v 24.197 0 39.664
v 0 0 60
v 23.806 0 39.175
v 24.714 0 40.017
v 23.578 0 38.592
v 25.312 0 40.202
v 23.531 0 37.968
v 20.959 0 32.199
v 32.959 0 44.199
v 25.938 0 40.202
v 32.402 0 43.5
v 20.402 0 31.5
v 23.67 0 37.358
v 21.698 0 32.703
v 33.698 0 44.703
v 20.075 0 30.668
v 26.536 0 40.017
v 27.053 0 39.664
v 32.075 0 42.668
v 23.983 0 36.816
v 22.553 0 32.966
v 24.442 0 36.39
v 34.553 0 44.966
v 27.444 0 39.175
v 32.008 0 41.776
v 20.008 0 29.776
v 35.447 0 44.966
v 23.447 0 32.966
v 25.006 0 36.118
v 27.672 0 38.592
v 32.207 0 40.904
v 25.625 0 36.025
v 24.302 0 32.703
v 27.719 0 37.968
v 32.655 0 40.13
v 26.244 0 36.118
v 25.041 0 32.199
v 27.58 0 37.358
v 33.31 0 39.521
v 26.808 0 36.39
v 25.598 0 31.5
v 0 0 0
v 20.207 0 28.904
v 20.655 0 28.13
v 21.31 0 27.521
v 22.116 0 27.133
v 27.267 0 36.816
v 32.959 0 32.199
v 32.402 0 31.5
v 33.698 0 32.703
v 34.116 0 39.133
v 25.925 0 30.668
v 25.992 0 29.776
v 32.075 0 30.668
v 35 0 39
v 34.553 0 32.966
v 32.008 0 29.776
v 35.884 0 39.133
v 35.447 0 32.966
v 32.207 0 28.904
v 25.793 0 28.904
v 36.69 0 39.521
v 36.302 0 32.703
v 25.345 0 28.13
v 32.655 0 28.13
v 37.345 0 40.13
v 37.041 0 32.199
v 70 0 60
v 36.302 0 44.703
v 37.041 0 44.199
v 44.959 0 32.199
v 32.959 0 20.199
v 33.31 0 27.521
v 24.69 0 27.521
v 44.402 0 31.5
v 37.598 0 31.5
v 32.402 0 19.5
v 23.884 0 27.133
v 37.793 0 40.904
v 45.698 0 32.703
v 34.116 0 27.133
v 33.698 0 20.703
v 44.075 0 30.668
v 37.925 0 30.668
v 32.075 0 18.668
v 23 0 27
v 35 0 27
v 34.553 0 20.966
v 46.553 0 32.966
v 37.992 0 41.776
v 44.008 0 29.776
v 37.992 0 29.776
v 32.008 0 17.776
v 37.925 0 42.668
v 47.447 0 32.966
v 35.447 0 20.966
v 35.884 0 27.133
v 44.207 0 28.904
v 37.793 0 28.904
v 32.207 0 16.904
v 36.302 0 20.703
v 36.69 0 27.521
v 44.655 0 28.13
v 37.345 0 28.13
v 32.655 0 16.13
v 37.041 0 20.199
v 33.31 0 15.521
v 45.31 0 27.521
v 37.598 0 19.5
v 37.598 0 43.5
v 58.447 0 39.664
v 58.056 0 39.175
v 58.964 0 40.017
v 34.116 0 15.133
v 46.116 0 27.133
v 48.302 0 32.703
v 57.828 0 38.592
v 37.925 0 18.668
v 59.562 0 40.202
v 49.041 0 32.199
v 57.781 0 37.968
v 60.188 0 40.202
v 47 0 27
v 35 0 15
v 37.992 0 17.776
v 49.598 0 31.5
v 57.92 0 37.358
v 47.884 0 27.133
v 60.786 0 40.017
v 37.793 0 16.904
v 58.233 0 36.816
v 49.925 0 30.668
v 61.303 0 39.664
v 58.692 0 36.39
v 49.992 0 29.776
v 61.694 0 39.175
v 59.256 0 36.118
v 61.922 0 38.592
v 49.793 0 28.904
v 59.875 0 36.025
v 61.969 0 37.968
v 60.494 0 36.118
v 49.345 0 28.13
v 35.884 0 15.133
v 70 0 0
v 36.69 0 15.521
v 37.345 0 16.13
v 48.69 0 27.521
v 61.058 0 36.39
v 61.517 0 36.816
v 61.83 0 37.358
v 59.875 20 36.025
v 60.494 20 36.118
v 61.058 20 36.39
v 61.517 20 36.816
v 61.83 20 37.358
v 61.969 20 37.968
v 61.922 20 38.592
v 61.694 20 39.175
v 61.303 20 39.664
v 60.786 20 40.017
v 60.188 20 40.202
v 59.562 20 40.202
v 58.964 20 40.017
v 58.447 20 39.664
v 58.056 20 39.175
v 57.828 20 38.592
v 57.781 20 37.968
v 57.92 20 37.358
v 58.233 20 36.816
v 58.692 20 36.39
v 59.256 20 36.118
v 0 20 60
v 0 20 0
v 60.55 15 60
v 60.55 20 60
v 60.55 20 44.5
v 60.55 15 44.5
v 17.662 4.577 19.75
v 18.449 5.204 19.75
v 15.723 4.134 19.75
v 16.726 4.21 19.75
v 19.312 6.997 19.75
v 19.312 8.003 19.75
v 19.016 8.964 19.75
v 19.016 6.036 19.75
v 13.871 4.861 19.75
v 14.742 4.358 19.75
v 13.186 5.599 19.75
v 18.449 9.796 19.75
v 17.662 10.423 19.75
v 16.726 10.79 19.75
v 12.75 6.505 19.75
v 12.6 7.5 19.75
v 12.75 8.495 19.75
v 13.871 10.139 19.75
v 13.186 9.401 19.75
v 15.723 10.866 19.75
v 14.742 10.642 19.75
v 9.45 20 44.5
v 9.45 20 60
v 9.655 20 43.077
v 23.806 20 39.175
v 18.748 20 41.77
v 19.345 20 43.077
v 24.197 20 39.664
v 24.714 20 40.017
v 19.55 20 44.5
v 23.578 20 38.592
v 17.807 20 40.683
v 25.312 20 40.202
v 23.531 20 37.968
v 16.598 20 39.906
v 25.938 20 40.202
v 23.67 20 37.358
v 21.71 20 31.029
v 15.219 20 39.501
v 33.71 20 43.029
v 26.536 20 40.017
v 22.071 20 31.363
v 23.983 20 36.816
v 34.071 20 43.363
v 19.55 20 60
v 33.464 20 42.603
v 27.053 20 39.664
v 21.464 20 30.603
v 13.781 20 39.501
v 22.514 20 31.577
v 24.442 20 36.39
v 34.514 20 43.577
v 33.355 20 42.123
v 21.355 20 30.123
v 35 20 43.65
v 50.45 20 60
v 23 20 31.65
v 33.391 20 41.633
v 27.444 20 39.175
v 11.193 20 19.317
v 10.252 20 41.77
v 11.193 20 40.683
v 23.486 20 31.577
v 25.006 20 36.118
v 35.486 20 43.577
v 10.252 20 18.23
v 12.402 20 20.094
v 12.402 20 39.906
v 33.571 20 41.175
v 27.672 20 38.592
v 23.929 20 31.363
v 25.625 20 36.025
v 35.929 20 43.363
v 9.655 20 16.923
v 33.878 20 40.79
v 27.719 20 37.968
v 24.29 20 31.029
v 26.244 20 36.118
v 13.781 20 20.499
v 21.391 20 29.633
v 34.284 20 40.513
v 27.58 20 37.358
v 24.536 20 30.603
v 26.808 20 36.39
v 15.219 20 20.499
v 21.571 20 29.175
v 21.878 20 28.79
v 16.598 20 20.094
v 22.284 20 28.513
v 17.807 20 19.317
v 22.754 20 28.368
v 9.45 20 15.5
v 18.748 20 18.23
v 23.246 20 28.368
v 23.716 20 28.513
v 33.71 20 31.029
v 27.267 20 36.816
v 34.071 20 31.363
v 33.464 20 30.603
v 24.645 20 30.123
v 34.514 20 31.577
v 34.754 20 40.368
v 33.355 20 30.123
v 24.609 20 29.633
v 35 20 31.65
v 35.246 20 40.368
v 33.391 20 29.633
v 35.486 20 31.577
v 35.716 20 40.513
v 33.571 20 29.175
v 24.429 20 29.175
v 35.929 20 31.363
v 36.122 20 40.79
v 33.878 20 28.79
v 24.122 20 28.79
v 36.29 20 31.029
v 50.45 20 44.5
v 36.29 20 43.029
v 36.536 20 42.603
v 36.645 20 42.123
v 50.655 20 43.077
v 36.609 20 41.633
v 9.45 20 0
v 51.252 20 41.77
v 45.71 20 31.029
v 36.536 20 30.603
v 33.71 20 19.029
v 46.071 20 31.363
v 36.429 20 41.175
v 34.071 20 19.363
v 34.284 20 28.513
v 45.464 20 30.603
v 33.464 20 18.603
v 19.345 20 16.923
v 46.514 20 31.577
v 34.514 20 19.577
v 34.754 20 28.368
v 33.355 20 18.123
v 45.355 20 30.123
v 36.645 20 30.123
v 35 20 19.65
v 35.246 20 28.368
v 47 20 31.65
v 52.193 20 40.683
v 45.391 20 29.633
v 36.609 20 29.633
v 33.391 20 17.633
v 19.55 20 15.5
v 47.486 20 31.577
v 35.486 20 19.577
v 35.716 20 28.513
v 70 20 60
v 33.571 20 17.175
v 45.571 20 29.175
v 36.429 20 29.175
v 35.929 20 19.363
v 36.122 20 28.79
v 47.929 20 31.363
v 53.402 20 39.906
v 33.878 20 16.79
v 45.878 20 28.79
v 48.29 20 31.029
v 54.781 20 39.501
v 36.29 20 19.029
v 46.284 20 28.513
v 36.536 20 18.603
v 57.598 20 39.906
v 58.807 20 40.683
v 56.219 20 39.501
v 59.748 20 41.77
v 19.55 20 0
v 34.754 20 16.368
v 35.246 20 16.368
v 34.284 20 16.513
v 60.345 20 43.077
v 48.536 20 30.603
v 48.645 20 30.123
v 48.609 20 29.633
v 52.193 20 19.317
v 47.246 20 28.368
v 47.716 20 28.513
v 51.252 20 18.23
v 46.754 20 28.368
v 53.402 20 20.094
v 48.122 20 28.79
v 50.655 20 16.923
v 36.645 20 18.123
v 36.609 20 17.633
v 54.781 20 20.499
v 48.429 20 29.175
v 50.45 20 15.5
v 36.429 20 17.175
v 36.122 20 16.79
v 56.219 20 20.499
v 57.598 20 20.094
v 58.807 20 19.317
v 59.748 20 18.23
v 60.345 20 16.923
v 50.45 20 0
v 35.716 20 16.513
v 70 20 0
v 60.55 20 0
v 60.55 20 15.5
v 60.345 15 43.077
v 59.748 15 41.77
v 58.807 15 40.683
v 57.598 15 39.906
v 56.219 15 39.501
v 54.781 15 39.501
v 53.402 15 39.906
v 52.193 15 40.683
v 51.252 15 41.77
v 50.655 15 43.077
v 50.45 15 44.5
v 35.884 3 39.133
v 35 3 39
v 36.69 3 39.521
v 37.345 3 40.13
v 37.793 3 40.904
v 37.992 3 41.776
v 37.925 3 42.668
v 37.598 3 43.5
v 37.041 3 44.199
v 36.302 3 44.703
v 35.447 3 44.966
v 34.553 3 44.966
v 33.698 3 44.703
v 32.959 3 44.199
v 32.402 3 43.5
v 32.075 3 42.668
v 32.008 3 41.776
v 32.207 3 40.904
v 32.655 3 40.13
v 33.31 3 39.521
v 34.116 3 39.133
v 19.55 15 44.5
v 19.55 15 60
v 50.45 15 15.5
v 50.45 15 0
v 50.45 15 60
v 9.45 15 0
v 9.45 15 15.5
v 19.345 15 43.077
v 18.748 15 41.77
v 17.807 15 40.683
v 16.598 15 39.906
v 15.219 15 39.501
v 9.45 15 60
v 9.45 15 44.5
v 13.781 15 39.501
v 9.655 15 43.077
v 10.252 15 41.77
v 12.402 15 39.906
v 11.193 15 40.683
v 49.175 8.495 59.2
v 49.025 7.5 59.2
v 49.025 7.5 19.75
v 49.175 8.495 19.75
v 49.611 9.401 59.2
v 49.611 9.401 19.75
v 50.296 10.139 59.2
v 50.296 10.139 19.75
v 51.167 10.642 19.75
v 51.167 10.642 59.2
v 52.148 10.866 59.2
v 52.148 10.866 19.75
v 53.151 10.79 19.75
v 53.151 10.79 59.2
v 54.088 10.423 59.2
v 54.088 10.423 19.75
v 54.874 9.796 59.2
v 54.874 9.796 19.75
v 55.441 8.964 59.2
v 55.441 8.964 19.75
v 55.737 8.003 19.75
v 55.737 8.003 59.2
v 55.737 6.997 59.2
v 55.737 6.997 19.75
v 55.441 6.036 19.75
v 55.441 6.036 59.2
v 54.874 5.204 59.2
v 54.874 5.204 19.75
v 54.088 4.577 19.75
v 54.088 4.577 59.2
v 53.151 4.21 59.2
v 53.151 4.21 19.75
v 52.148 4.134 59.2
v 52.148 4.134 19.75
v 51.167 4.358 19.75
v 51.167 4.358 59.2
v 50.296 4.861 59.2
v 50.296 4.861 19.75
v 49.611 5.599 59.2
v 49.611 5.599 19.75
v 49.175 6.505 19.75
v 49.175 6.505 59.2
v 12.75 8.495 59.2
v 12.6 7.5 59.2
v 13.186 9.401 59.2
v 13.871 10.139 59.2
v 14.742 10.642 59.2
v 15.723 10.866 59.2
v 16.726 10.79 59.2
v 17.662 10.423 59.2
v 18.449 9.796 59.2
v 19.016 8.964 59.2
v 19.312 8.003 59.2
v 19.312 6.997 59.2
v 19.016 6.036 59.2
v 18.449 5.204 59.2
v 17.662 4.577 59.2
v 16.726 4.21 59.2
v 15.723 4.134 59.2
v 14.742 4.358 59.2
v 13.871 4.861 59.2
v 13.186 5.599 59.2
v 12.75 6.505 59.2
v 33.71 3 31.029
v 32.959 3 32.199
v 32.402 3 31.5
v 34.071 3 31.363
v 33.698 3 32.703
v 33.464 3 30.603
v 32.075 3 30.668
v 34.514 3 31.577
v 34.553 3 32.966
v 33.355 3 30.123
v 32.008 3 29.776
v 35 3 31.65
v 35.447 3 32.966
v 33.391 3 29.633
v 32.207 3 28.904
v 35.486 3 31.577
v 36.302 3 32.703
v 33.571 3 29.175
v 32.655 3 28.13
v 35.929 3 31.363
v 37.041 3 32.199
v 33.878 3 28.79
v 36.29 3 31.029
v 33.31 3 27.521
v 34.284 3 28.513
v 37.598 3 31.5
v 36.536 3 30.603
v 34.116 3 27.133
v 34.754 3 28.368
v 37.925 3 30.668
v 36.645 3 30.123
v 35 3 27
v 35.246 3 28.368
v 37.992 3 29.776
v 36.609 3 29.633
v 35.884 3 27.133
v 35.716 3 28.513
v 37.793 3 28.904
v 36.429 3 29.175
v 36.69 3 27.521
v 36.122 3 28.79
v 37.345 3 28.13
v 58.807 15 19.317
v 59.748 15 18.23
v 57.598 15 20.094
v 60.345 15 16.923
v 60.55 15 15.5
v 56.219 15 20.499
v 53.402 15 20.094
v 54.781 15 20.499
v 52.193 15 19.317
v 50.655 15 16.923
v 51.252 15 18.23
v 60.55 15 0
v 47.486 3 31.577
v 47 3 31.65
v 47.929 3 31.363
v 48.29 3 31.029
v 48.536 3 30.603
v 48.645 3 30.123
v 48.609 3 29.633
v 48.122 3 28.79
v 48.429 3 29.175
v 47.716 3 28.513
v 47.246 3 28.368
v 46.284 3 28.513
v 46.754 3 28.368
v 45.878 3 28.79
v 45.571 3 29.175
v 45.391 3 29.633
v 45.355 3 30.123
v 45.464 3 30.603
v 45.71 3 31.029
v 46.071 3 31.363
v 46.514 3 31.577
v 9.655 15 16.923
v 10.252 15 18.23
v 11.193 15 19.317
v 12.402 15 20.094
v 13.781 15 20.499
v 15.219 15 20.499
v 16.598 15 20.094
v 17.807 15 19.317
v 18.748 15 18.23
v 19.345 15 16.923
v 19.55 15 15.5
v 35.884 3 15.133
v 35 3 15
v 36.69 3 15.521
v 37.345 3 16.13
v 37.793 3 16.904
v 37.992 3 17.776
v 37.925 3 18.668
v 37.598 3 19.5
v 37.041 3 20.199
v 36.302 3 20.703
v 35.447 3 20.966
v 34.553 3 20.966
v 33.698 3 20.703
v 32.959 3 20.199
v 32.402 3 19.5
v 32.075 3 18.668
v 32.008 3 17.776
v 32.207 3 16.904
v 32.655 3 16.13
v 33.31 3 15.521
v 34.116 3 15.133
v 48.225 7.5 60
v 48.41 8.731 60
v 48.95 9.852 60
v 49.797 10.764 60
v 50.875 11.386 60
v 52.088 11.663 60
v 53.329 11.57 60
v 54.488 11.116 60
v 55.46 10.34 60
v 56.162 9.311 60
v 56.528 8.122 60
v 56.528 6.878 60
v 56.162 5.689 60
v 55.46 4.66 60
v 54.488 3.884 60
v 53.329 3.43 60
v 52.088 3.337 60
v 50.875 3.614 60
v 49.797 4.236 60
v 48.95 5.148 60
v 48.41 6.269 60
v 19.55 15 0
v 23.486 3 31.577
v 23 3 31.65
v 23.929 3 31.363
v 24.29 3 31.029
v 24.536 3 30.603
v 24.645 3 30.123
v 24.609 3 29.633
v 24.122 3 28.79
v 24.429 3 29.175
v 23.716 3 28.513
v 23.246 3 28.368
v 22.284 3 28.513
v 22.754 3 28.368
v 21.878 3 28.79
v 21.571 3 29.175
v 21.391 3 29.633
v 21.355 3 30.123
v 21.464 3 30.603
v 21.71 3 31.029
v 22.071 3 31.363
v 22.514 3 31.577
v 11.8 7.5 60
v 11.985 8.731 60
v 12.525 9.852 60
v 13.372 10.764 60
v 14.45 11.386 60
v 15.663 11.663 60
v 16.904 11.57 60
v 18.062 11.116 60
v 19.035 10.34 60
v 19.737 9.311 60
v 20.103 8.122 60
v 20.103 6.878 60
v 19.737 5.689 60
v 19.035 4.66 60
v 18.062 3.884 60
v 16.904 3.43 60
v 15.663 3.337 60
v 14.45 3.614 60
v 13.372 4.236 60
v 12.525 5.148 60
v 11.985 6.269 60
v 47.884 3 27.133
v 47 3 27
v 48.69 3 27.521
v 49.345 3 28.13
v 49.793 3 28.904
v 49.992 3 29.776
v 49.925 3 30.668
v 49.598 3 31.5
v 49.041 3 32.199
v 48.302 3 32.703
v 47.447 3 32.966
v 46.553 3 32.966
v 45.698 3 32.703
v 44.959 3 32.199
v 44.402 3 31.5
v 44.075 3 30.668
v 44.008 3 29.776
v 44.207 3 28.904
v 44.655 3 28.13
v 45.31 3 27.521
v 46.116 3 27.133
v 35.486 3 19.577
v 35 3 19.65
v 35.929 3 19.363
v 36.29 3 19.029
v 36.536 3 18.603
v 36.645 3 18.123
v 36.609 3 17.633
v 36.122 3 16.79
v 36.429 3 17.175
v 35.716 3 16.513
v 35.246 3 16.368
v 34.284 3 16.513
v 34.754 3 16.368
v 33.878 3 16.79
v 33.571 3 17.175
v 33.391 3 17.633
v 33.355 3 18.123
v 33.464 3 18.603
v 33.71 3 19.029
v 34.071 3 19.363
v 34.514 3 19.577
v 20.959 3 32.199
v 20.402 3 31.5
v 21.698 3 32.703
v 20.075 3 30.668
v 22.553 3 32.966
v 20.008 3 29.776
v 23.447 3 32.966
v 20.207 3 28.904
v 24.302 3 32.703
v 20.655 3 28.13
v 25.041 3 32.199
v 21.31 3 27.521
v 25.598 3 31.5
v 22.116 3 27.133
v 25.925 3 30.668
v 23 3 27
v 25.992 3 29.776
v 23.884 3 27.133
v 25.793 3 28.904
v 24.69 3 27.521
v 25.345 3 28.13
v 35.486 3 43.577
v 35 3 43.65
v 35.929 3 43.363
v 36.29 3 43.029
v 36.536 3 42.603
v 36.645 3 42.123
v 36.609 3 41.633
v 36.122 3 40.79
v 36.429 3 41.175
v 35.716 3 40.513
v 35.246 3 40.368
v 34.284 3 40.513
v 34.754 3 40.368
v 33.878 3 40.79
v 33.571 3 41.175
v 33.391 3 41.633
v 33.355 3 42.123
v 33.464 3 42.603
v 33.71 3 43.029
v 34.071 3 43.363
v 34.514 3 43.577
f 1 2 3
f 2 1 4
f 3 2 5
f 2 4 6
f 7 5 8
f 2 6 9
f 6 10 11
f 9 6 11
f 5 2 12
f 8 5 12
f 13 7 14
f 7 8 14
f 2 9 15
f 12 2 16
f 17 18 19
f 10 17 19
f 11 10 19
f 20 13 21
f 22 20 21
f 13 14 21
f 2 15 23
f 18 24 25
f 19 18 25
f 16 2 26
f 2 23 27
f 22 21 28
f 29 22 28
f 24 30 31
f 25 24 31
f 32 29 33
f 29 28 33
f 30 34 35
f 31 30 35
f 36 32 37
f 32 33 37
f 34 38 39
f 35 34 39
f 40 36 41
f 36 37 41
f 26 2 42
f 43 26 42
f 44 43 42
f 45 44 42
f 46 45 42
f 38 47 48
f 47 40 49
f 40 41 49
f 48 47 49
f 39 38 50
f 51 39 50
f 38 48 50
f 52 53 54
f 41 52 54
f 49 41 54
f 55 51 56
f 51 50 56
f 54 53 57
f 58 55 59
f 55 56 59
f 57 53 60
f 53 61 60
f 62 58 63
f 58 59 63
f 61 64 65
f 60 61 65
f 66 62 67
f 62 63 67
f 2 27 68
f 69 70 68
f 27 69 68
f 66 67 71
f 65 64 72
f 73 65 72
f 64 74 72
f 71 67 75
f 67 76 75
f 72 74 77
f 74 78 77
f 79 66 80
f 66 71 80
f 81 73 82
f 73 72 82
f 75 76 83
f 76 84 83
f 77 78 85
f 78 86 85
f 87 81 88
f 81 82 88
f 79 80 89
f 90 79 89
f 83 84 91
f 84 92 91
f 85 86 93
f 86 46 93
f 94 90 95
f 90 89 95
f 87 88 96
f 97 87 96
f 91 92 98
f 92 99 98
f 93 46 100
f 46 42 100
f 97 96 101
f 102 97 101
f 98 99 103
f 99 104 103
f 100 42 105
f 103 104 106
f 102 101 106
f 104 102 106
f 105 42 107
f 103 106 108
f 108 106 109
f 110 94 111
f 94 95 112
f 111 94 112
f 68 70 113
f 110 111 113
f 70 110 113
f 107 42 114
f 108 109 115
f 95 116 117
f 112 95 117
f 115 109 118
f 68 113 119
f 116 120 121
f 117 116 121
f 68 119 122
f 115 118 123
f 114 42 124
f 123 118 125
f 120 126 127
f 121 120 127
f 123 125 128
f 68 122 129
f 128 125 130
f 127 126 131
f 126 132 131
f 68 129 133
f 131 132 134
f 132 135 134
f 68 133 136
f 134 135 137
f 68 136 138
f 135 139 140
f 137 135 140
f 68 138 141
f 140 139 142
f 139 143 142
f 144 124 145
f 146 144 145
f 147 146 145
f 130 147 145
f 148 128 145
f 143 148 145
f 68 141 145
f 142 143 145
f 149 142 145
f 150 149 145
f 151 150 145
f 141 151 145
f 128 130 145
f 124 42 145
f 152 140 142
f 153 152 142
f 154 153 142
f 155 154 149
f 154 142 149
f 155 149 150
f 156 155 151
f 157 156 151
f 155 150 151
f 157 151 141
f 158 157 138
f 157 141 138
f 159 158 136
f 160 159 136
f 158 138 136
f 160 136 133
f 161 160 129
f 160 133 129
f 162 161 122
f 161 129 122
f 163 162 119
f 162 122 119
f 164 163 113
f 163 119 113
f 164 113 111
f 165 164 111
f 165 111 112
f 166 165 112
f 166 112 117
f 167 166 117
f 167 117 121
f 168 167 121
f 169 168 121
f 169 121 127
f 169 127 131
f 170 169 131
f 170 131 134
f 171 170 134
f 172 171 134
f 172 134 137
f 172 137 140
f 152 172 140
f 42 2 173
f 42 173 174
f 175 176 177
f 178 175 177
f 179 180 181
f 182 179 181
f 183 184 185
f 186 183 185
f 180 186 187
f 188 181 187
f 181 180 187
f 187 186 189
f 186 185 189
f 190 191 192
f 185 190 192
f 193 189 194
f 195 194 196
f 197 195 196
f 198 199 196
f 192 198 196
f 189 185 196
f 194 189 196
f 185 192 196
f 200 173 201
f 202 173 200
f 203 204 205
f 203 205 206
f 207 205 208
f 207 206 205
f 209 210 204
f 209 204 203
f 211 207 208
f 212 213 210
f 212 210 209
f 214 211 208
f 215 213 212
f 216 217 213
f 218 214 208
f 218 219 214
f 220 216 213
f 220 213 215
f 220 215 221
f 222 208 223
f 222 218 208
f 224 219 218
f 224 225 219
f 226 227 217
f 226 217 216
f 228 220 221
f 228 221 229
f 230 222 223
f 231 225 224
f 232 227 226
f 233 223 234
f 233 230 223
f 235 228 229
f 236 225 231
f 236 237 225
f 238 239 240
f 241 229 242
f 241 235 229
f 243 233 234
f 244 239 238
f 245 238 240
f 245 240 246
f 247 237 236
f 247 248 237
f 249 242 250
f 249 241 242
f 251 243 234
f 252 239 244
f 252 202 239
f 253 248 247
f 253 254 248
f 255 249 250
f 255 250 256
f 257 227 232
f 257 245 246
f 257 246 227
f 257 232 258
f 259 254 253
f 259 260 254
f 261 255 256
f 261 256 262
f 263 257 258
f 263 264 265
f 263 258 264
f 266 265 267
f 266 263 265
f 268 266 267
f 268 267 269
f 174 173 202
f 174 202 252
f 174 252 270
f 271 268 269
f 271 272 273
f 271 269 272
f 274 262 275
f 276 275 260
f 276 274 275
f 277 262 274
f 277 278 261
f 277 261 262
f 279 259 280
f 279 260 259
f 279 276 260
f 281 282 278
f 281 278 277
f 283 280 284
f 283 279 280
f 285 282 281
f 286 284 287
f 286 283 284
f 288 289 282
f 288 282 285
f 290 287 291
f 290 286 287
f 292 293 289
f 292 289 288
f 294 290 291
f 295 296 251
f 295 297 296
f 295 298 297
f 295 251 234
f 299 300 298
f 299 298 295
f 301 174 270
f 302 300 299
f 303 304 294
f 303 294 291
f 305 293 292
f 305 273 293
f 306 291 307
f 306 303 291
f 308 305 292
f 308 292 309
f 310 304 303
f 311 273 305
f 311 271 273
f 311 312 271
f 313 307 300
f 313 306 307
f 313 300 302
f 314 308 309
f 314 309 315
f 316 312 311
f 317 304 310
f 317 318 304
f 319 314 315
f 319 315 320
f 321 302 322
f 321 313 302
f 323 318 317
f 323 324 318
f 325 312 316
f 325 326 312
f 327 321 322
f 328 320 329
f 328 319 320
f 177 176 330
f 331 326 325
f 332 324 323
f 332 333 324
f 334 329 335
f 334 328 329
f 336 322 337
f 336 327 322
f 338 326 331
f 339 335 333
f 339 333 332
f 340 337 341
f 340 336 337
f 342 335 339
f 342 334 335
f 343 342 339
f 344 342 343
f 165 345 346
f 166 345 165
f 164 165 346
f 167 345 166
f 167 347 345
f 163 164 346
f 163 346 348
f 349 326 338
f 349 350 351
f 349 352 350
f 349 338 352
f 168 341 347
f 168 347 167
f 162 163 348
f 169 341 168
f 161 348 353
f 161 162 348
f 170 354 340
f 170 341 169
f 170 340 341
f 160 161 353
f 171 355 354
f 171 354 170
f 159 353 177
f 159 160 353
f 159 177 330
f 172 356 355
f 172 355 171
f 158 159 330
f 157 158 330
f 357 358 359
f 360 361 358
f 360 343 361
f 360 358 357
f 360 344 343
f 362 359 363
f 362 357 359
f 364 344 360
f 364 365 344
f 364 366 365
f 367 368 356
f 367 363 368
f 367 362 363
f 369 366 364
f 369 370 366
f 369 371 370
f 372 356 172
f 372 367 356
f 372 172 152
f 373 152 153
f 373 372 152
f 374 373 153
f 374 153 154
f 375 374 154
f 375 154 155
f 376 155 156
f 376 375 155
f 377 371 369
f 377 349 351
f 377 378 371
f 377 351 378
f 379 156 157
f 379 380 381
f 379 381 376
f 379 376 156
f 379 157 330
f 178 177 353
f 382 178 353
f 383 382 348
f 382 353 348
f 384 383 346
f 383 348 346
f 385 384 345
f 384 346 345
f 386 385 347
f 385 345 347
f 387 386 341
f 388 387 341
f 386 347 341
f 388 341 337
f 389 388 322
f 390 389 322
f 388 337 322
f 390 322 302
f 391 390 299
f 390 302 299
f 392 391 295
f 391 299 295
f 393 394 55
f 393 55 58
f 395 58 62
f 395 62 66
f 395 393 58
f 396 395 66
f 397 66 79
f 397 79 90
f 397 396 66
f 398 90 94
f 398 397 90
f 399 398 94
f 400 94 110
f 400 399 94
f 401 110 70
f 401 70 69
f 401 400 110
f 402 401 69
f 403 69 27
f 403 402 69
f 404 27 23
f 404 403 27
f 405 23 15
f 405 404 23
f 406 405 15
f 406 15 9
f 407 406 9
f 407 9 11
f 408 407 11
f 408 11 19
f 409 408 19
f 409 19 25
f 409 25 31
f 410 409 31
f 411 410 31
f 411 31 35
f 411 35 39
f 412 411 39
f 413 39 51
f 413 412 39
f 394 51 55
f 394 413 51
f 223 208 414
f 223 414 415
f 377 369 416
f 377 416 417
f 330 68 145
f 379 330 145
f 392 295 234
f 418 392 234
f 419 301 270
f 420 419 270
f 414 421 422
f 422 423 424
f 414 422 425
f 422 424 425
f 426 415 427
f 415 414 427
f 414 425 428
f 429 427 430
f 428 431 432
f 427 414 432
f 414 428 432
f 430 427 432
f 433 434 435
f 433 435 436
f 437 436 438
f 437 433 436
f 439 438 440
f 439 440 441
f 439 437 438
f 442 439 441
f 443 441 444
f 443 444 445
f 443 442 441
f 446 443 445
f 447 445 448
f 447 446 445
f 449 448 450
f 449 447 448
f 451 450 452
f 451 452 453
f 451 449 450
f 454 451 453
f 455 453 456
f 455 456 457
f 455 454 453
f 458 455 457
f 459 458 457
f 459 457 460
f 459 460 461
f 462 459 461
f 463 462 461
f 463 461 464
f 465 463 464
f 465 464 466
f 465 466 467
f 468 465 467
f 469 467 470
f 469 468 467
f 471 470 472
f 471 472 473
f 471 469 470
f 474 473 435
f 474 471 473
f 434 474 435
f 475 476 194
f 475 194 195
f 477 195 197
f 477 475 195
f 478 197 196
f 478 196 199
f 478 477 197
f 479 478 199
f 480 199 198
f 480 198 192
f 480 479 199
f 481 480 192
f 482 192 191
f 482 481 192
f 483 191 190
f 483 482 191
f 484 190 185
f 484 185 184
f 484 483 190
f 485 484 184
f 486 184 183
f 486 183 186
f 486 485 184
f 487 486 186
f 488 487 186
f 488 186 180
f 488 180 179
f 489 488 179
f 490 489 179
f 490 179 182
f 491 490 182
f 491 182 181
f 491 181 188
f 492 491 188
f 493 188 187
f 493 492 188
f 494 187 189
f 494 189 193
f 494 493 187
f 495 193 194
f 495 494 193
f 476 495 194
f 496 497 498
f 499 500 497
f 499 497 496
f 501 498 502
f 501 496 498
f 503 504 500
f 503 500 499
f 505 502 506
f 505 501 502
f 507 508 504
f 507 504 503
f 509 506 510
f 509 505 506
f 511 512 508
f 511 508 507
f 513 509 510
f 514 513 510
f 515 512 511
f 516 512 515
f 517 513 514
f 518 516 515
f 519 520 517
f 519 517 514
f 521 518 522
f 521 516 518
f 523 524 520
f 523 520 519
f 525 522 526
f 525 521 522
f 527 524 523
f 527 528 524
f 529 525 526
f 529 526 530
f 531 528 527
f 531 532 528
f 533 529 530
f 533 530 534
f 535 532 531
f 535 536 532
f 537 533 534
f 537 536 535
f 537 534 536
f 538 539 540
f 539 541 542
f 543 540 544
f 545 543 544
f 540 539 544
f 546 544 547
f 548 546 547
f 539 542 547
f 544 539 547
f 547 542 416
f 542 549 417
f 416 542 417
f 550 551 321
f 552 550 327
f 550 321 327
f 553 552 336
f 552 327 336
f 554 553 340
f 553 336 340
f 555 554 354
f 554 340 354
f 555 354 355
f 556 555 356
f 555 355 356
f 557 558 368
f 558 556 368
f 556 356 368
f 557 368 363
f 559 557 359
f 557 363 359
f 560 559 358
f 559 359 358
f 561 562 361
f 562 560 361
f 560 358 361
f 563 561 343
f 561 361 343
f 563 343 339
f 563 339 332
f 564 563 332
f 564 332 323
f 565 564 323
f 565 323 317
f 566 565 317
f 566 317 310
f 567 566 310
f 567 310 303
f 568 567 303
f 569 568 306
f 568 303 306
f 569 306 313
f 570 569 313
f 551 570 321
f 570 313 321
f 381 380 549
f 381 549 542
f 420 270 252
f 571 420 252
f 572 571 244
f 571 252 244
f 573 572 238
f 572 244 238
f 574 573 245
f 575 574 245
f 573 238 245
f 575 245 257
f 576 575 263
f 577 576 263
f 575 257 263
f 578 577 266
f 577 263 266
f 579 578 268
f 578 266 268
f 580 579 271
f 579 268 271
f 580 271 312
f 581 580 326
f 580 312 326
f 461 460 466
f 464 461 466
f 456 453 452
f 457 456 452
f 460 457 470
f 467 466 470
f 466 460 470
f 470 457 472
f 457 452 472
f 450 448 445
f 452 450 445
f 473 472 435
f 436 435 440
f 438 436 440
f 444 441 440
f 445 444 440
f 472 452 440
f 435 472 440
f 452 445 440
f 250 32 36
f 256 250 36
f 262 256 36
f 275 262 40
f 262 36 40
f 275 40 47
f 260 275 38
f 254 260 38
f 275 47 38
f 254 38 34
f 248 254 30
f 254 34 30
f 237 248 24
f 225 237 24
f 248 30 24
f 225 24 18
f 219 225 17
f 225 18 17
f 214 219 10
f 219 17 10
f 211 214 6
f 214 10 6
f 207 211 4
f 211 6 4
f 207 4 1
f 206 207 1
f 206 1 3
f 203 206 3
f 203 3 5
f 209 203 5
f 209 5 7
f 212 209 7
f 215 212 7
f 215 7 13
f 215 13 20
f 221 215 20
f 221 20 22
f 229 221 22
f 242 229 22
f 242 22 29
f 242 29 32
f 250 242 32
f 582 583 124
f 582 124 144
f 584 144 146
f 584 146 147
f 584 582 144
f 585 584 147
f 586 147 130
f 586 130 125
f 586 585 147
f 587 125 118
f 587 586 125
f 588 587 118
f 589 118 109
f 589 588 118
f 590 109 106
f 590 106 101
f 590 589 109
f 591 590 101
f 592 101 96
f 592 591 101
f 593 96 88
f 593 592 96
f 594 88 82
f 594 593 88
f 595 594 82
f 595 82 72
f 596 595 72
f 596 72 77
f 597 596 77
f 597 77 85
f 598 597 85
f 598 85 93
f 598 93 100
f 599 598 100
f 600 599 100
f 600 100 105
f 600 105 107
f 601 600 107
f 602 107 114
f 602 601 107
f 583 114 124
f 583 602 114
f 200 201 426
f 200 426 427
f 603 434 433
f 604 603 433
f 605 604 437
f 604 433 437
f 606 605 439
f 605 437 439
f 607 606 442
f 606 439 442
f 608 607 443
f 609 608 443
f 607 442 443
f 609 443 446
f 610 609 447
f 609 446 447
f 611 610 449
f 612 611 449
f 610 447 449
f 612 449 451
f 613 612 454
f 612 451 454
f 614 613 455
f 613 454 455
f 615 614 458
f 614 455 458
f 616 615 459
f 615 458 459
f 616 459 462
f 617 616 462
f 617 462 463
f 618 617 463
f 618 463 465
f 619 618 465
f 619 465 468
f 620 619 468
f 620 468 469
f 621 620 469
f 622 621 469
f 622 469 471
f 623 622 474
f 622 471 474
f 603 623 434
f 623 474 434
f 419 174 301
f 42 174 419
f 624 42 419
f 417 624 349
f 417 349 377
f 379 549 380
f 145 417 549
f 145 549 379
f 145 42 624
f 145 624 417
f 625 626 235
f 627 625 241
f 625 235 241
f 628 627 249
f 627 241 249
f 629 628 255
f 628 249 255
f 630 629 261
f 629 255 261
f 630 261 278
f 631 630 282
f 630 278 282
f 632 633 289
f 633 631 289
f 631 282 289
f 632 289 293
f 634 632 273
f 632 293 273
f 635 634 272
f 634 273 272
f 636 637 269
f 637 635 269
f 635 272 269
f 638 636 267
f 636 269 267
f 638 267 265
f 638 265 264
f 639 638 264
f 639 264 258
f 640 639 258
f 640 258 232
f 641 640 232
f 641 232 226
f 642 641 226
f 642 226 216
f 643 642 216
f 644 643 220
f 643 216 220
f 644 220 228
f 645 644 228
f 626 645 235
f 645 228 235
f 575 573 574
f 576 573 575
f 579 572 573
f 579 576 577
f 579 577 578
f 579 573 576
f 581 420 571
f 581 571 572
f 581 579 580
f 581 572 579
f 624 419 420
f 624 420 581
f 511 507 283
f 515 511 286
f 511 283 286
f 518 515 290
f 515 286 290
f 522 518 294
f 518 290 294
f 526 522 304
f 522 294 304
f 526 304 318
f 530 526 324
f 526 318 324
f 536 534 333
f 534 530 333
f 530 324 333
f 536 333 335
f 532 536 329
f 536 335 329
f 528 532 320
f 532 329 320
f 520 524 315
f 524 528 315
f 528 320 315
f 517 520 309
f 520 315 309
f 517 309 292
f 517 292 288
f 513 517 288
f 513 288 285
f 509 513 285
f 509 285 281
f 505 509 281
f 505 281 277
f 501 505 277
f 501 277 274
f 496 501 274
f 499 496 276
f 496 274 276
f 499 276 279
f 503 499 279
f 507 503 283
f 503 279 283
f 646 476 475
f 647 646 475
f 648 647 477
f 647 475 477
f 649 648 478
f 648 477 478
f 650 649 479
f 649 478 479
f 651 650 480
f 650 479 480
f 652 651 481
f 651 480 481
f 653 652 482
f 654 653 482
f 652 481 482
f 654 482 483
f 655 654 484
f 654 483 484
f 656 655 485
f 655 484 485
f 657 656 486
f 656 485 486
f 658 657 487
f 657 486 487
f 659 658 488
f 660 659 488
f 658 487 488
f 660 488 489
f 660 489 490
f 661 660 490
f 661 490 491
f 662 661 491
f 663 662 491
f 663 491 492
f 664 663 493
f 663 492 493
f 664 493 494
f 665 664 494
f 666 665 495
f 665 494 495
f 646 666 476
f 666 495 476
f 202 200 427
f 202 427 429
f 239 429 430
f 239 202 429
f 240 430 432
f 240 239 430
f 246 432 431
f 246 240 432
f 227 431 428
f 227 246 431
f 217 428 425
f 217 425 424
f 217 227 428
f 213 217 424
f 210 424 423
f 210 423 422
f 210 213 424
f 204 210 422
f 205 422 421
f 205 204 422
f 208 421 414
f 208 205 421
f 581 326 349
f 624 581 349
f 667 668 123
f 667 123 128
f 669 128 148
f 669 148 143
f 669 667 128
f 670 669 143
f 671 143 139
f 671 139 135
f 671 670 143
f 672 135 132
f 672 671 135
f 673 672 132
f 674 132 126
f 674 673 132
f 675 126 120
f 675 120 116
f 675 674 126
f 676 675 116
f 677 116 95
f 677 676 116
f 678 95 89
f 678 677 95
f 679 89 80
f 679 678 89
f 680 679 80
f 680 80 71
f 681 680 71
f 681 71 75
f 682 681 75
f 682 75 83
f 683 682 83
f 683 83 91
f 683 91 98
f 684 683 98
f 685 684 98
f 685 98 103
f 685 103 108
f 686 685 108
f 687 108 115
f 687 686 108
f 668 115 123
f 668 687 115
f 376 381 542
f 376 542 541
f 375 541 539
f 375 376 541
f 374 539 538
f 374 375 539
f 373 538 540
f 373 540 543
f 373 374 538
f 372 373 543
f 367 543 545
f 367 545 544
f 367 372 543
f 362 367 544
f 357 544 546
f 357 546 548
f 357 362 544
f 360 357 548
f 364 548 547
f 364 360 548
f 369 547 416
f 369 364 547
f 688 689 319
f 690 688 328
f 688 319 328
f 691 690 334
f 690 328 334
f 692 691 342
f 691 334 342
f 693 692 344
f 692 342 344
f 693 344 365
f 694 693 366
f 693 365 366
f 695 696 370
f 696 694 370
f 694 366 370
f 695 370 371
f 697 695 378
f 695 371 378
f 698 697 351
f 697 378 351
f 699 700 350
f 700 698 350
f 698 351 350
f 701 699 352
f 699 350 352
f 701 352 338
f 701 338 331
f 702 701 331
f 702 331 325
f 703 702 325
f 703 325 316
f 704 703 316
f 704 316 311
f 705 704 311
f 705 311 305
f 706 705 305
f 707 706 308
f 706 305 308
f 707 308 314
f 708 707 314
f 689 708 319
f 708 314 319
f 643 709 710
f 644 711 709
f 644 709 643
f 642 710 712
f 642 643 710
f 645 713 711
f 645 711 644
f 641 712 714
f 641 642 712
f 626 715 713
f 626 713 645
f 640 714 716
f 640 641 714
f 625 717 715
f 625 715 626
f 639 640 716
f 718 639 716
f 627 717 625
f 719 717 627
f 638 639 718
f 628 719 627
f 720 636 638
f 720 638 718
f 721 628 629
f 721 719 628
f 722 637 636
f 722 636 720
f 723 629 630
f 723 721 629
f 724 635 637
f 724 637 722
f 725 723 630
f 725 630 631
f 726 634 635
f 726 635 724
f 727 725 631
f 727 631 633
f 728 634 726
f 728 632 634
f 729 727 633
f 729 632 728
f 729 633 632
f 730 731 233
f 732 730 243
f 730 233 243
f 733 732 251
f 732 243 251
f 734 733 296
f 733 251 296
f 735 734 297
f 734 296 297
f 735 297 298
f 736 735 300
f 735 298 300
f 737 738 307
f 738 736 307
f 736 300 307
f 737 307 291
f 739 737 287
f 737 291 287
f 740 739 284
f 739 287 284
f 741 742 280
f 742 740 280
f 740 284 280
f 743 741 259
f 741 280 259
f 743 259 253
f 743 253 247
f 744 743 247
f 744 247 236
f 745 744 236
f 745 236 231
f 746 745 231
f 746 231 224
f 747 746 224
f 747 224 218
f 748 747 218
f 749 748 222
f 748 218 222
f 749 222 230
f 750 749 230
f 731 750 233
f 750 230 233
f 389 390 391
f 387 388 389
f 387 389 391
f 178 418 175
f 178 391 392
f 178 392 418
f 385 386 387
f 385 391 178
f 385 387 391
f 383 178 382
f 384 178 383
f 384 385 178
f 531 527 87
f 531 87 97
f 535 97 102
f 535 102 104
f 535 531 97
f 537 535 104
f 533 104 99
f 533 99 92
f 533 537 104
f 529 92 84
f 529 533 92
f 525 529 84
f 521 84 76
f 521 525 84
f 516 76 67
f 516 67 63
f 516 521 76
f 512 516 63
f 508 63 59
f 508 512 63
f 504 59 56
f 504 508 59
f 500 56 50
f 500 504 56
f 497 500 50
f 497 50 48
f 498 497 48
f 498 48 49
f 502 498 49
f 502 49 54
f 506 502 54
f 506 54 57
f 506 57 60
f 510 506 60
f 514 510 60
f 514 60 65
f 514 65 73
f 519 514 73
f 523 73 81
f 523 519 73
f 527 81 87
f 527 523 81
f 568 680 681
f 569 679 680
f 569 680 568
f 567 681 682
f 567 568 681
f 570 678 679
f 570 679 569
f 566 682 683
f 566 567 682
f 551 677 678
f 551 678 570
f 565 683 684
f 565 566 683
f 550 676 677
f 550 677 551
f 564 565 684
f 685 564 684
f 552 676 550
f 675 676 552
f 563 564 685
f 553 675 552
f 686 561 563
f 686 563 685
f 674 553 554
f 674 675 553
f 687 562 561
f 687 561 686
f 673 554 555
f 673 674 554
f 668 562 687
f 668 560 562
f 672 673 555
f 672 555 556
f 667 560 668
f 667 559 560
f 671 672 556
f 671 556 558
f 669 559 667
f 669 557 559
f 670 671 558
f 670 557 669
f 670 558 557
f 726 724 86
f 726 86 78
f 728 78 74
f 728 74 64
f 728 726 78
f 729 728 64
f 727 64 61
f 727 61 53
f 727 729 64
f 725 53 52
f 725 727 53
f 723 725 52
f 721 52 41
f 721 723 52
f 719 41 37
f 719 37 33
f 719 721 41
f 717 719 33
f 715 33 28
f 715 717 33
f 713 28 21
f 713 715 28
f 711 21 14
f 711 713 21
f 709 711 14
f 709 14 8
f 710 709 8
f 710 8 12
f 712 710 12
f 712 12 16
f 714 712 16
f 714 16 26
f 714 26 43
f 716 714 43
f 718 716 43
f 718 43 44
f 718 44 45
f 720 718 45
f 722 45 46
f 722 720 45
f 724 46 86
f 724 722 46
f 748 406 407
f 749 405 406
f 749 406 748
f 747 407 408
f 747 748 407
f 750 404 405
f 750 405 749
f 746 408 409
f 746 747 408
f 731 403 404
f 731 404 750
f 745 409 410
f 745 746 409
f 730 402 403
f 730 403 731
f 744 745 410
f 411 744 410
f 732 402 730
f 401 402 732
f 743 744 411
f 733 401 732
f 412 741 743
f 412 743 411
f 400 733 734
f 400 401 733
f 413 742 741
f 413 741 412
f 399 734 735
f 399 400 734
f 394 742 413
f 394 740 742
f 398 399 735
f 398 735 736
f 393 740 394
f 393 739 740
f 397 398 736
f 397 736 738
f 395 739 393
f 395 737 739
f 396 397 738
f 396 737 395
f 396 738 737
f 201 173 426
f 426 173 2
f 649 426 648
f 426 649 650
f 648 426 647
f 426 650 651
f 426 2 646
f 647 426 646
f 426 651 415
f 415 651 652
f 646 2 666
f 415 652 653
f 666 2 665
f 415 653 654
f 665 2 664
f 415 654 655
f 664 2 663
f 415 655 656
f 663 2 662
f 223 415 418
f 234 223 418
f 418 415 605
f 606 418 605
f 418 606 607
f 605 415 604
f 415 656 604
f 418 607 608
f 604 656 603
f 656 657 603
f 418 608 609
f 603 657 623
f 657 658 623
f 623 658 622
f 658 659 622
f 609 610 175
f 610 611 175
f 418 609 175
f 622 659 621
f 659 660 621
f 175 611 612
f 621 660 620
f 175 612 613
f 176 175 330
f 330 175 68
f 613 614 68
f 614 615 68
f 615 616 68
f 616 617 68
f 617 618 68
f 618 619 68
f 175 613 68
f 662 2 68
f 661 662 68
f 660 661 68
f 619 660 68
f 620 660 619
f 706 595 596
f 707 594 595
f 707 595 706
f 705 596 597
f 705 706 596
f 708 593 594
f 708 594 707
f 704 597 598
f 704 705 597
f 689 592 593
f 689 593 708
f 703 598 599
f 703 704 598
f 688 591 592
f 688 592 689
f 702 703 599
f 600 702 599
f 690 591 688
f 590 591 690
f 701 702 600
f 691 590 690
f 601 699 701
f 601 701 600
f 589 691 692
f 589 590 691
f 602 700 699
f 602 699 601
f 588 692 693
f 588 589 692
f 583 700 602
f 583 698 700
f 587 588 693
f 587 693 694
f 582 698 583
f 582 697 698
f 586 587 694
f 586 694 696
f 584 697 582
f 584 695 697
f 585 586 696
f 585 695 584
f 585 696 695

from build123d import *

# Parameters (mm, degrees)
SKETCH3_W           = 70
SKETCH3_H           = 60
BOSS_EXTRUDE3_DEPTH = 20
SKETCH4_R           = 1.65
CUT_EXTRUDE1_DEPTH  = 95.339811321
SKETCH6_R           = 2.1
CUT_EXTRUDE2_DEPTH  = 95.339811321
SKETCH9_R           = 3.375
CUT_EXTRUDE3_DEPTH  = 40.25
CUT_EXTRUDE4_START  = -3
SKETCH11_R          = 3
SKETCH11_R_2        = 1.65
CUT_EXTRUDE4_DEPTH  = 3
CUT_EXTRUDE5_DEPTH  = 5
CHAMFER2_SIZE       = 0.8


with BuildPart() as part:
    # Sketch3 → Boss-Extrude3 (new body)
    with BuildSketch(Plane(origin=(0, 0, 0), x_dir=(1, 0, 0), z_dir=(0, 1, 0))):
        with Locations((35, -30)):
            Rectangle(SKETCH3_W, SKETCH3_H)
    extrude(amount=BOSS_EXTRUDE3_DEPTH)

    # Sketch4 → Cut-Extrude1 (cut, through all)
    with BuildSketch(Plane(origin=(0, 20, 0), x_dir=(1, 0, 0), z_dir=(0, 1, 0))):
        with Locations(Location((35, -30, 0), (0, 0, 270))):
            Circle(SKETCH4_R)
        with Locations(Location((35, -18, 0), (0, 0, 270))):
            Circle(SKETCH4_R)
        with Locations(Location((47, -30, 0), (0, 0, 270))):
            Circle(SKETCH4_R)
        with Locations(Location((35, -42, 0), (0, 0, 270))):
            Circle(SKETCH4_R)
        with Locations(Location((23, -30, 0), (0, 0, 270))):
            Circle(SKETCH4_R)
    extrude(amount=-CUT_EXTRUDE1_DEPTH, mode=Mode.SUBTRACT)

    # Sketch6 → Cut-Extrude2 (cut, through all)
    with BuildSketch(Plane.XZ):
        with Locations(Location((25.625, 38.125, 0), (0, 0, 270))):
            Circle(SKETCH6_R)
        with Locations(Location((59.875, 38.125, 0), (0, 0, 270))):
            Circle(SKETCH6_R)
    extrude(amount=-CUT_EXTRUDE2_DEPTH, mode=Mode.SUBTRACT)

    # Sketch9 → Cut-Extrude3 (cut)
    with BuildSketch(Plane(origin=(0, 0, 60), x_dir=(-1, 0, 0), z_dir=(0, 0, -1))):
        with Locations((-52.4, 7.5)):
            Circle(SKETCH9_R)
        with Locations((-15.975, 7.5)):
            Circle(SKETCH9_R)
    extrude(amount=CUT_EXTRUDE3_DEPTH, mode=Mode.SUBTRACT)

    # Sketch11 → Cut-Extrude4 (cut)
    # profile 1 of 10: a face of its own
    with BuildSketch(Plane.XZ.offset(CUT_EXTRUDE4_START)):
        with Locations(Location((35, 18, 0), (0, 0, 270))):
            Circle(SKETCH11_R)
        with Locations(Location((35, 18, 0), (0, 0, 90))):
            Circle(SKETCH11_R_2, mode=Mode.SUBTRACT)
    # profile 2 of 10: a face of its own
    with BuildSketch(Plane.XZ.offset(CUT_EXTRUDE4_START)):
        with Locations(Location((35, 30, 0), (0, 0, 270))):
            Circle(SKETCH11_R)
        with Locations(Location((35, 30, 0), (0, 0, 90))):
            Circle(SKETCH11_R_2, mode=Mode.SUBTRACT)
    # profile 3 of 10: a face of its own
    with BuildSketch(Plane.XZ.offset(CUT_EXTRUDE4_START)):
        with Locations(Location((47, 30, 0), (0, 0, 270))):
            Circle(SKETCH11_R)
        with Locations(Location((47, 30, 0), (0, 0, 90))):
            Circle(SKETCH11_R_2, mode=Mode.SUBTRACT)
    # profile 4 of 10: a face of its own
    with BuildSketch(Plane.XZ.offset(CUT_EXTRUDE4_START)):
        with Locations(Location((23, 30, 0), (0, 0, 270))):
            Circle(SKETCH11_R)
        with Locations(Location((23, 30, 0), (0, 0, 90))):
            Circle(SKETCH11_R_2, mode=Mode.SUBTRACT)
    # profile 5 of 10: a face of its own
    with BuildSketch(Plane.XZ.offset(CUT_EXTRUDE4_START)):
        with Locations(Location((35, 42, 0), (0, 0, 270))):
            Circle(SKETCH11_R)
        with Locations(Location((35, 42, 0), (0, 0, 90))):
            Circle(SKETCH11_R_2, mode=Mode.SUBTRACT)
    # profile 6 of 10: a face of its own
    with BuildSketch(Plane.XZ.offset(CUT_EXTRUDE4_START)):
        with Locations(Location((35, 42, 0), (0, 0, 90))):
            Circle(SKETCH11_R_2)
    # profile 7 of 10: a face of its own
    with BuildSketch(Plane.XZ.offset(CUT_EXTRUDE4_START)):
        with Locations(Location((23, 30, 0), (0, 0, 90))):
            Circle(SKETCH11_R_2)
    # profile 8 of 10: a face of its own
    with BuildSketch(Plane.XZ.offset(CUT_EXTRUDE4_START)):
        with Locations(Location((35, 30, 0), (0, 0, 90))):
            Circle(SKETCH11_R_2)
    # profile 9 of 10: a face of its own
    with BuildSketch(Plane.XZ.offset(CUT_EXTRUDE4_START)):
        with Locations(Location((47, 30, 0), (0, 0, 90))):
            Circle(SKETCH11_R_2)
    # profile 10 of 10: a face of its own
    with BuildSketch(Plane.XZ.offset(CUT_EXTRUDE4_START)):
        with Locations(Location((35, 18, 0), (0, 0, 90))):
            Circle(SKETCH11_R_2)
    extrude(amount=CUT_EXTRUDE4_DEPTH, mode=Mode.SUBTRACT)

    # Sketch12 → Cut-Extrude5 (cut)
    with BuildSketch(Plane(origin=(0, 20, 0), x_dir=(1, 0, 0), z_dir=(0, 1, 0))):
        with BuildLine():
            Line((9.45, -60.104949747), (9.45, -44.5))
            ThreePointArc((9.45, -44.5), (14.5, -39.45), (19.55, -44.5))
            Line((19.55, -44.5), (19.55, -60.104949747))
            ThreePointArc((19.55, -60.104949747), (14.5, -65.154949747), (9.45, -60.104949747))
        make_face()
        with BuildLine():
            Line((60.55, -60.104949747), (60.55, -44.5))
            ThreePointArc((60.55, -44.5), (55.5, -39.45), (50.45, -44.5))
            Line((50.45, -44.5), (50.45, -60.104949747))
            ThreePointArc((50.45, -60.104949747), (55.5, -65.154949747), (60.55, -60.104949747))
        make_face()
        with BuildLine():
            Line((60.55, 0.104949747), (60.55, -15.5))
            ThreePointArc((60.55, -15.5), (55.5, -20.55), (50.45, -15.5))
            Line((50.45, -15.5), (50.45, 0.104949747))
            ThreePointArc((50.45, 0.104949747), (55.5, 5.154949747), (60.55, 0.104949747))
        make_face()
        with BuildLine():
            Line((9.45, 0.104949747), (9.45, -15.5))
            ThreePointArc((9.45, -15.5), (14.5, -20.55), (19.55, -15.5))
            Line((19.55, -15.5), (19.55, 0.104949747))
            ThreePointArc((19.55, 0.104949747), (14.5, 5.154949747), (9.45, 0.104949747))
        make_face()
    extrude(amount=-CUT_EXTRUDE5_DEPTH, mode=Mode.SUBTRACT)

    # Chamfer2
    chamfer2_edges = [part.edges().sort_by_distance(p)[0] for p in [
        (55.775, 7.5, 60),
        (19.35, 7.5, 60),
    ]]
    chamfer(chamfer2_edges, length=CHAMFER2_SIZE)


solid = part.part
